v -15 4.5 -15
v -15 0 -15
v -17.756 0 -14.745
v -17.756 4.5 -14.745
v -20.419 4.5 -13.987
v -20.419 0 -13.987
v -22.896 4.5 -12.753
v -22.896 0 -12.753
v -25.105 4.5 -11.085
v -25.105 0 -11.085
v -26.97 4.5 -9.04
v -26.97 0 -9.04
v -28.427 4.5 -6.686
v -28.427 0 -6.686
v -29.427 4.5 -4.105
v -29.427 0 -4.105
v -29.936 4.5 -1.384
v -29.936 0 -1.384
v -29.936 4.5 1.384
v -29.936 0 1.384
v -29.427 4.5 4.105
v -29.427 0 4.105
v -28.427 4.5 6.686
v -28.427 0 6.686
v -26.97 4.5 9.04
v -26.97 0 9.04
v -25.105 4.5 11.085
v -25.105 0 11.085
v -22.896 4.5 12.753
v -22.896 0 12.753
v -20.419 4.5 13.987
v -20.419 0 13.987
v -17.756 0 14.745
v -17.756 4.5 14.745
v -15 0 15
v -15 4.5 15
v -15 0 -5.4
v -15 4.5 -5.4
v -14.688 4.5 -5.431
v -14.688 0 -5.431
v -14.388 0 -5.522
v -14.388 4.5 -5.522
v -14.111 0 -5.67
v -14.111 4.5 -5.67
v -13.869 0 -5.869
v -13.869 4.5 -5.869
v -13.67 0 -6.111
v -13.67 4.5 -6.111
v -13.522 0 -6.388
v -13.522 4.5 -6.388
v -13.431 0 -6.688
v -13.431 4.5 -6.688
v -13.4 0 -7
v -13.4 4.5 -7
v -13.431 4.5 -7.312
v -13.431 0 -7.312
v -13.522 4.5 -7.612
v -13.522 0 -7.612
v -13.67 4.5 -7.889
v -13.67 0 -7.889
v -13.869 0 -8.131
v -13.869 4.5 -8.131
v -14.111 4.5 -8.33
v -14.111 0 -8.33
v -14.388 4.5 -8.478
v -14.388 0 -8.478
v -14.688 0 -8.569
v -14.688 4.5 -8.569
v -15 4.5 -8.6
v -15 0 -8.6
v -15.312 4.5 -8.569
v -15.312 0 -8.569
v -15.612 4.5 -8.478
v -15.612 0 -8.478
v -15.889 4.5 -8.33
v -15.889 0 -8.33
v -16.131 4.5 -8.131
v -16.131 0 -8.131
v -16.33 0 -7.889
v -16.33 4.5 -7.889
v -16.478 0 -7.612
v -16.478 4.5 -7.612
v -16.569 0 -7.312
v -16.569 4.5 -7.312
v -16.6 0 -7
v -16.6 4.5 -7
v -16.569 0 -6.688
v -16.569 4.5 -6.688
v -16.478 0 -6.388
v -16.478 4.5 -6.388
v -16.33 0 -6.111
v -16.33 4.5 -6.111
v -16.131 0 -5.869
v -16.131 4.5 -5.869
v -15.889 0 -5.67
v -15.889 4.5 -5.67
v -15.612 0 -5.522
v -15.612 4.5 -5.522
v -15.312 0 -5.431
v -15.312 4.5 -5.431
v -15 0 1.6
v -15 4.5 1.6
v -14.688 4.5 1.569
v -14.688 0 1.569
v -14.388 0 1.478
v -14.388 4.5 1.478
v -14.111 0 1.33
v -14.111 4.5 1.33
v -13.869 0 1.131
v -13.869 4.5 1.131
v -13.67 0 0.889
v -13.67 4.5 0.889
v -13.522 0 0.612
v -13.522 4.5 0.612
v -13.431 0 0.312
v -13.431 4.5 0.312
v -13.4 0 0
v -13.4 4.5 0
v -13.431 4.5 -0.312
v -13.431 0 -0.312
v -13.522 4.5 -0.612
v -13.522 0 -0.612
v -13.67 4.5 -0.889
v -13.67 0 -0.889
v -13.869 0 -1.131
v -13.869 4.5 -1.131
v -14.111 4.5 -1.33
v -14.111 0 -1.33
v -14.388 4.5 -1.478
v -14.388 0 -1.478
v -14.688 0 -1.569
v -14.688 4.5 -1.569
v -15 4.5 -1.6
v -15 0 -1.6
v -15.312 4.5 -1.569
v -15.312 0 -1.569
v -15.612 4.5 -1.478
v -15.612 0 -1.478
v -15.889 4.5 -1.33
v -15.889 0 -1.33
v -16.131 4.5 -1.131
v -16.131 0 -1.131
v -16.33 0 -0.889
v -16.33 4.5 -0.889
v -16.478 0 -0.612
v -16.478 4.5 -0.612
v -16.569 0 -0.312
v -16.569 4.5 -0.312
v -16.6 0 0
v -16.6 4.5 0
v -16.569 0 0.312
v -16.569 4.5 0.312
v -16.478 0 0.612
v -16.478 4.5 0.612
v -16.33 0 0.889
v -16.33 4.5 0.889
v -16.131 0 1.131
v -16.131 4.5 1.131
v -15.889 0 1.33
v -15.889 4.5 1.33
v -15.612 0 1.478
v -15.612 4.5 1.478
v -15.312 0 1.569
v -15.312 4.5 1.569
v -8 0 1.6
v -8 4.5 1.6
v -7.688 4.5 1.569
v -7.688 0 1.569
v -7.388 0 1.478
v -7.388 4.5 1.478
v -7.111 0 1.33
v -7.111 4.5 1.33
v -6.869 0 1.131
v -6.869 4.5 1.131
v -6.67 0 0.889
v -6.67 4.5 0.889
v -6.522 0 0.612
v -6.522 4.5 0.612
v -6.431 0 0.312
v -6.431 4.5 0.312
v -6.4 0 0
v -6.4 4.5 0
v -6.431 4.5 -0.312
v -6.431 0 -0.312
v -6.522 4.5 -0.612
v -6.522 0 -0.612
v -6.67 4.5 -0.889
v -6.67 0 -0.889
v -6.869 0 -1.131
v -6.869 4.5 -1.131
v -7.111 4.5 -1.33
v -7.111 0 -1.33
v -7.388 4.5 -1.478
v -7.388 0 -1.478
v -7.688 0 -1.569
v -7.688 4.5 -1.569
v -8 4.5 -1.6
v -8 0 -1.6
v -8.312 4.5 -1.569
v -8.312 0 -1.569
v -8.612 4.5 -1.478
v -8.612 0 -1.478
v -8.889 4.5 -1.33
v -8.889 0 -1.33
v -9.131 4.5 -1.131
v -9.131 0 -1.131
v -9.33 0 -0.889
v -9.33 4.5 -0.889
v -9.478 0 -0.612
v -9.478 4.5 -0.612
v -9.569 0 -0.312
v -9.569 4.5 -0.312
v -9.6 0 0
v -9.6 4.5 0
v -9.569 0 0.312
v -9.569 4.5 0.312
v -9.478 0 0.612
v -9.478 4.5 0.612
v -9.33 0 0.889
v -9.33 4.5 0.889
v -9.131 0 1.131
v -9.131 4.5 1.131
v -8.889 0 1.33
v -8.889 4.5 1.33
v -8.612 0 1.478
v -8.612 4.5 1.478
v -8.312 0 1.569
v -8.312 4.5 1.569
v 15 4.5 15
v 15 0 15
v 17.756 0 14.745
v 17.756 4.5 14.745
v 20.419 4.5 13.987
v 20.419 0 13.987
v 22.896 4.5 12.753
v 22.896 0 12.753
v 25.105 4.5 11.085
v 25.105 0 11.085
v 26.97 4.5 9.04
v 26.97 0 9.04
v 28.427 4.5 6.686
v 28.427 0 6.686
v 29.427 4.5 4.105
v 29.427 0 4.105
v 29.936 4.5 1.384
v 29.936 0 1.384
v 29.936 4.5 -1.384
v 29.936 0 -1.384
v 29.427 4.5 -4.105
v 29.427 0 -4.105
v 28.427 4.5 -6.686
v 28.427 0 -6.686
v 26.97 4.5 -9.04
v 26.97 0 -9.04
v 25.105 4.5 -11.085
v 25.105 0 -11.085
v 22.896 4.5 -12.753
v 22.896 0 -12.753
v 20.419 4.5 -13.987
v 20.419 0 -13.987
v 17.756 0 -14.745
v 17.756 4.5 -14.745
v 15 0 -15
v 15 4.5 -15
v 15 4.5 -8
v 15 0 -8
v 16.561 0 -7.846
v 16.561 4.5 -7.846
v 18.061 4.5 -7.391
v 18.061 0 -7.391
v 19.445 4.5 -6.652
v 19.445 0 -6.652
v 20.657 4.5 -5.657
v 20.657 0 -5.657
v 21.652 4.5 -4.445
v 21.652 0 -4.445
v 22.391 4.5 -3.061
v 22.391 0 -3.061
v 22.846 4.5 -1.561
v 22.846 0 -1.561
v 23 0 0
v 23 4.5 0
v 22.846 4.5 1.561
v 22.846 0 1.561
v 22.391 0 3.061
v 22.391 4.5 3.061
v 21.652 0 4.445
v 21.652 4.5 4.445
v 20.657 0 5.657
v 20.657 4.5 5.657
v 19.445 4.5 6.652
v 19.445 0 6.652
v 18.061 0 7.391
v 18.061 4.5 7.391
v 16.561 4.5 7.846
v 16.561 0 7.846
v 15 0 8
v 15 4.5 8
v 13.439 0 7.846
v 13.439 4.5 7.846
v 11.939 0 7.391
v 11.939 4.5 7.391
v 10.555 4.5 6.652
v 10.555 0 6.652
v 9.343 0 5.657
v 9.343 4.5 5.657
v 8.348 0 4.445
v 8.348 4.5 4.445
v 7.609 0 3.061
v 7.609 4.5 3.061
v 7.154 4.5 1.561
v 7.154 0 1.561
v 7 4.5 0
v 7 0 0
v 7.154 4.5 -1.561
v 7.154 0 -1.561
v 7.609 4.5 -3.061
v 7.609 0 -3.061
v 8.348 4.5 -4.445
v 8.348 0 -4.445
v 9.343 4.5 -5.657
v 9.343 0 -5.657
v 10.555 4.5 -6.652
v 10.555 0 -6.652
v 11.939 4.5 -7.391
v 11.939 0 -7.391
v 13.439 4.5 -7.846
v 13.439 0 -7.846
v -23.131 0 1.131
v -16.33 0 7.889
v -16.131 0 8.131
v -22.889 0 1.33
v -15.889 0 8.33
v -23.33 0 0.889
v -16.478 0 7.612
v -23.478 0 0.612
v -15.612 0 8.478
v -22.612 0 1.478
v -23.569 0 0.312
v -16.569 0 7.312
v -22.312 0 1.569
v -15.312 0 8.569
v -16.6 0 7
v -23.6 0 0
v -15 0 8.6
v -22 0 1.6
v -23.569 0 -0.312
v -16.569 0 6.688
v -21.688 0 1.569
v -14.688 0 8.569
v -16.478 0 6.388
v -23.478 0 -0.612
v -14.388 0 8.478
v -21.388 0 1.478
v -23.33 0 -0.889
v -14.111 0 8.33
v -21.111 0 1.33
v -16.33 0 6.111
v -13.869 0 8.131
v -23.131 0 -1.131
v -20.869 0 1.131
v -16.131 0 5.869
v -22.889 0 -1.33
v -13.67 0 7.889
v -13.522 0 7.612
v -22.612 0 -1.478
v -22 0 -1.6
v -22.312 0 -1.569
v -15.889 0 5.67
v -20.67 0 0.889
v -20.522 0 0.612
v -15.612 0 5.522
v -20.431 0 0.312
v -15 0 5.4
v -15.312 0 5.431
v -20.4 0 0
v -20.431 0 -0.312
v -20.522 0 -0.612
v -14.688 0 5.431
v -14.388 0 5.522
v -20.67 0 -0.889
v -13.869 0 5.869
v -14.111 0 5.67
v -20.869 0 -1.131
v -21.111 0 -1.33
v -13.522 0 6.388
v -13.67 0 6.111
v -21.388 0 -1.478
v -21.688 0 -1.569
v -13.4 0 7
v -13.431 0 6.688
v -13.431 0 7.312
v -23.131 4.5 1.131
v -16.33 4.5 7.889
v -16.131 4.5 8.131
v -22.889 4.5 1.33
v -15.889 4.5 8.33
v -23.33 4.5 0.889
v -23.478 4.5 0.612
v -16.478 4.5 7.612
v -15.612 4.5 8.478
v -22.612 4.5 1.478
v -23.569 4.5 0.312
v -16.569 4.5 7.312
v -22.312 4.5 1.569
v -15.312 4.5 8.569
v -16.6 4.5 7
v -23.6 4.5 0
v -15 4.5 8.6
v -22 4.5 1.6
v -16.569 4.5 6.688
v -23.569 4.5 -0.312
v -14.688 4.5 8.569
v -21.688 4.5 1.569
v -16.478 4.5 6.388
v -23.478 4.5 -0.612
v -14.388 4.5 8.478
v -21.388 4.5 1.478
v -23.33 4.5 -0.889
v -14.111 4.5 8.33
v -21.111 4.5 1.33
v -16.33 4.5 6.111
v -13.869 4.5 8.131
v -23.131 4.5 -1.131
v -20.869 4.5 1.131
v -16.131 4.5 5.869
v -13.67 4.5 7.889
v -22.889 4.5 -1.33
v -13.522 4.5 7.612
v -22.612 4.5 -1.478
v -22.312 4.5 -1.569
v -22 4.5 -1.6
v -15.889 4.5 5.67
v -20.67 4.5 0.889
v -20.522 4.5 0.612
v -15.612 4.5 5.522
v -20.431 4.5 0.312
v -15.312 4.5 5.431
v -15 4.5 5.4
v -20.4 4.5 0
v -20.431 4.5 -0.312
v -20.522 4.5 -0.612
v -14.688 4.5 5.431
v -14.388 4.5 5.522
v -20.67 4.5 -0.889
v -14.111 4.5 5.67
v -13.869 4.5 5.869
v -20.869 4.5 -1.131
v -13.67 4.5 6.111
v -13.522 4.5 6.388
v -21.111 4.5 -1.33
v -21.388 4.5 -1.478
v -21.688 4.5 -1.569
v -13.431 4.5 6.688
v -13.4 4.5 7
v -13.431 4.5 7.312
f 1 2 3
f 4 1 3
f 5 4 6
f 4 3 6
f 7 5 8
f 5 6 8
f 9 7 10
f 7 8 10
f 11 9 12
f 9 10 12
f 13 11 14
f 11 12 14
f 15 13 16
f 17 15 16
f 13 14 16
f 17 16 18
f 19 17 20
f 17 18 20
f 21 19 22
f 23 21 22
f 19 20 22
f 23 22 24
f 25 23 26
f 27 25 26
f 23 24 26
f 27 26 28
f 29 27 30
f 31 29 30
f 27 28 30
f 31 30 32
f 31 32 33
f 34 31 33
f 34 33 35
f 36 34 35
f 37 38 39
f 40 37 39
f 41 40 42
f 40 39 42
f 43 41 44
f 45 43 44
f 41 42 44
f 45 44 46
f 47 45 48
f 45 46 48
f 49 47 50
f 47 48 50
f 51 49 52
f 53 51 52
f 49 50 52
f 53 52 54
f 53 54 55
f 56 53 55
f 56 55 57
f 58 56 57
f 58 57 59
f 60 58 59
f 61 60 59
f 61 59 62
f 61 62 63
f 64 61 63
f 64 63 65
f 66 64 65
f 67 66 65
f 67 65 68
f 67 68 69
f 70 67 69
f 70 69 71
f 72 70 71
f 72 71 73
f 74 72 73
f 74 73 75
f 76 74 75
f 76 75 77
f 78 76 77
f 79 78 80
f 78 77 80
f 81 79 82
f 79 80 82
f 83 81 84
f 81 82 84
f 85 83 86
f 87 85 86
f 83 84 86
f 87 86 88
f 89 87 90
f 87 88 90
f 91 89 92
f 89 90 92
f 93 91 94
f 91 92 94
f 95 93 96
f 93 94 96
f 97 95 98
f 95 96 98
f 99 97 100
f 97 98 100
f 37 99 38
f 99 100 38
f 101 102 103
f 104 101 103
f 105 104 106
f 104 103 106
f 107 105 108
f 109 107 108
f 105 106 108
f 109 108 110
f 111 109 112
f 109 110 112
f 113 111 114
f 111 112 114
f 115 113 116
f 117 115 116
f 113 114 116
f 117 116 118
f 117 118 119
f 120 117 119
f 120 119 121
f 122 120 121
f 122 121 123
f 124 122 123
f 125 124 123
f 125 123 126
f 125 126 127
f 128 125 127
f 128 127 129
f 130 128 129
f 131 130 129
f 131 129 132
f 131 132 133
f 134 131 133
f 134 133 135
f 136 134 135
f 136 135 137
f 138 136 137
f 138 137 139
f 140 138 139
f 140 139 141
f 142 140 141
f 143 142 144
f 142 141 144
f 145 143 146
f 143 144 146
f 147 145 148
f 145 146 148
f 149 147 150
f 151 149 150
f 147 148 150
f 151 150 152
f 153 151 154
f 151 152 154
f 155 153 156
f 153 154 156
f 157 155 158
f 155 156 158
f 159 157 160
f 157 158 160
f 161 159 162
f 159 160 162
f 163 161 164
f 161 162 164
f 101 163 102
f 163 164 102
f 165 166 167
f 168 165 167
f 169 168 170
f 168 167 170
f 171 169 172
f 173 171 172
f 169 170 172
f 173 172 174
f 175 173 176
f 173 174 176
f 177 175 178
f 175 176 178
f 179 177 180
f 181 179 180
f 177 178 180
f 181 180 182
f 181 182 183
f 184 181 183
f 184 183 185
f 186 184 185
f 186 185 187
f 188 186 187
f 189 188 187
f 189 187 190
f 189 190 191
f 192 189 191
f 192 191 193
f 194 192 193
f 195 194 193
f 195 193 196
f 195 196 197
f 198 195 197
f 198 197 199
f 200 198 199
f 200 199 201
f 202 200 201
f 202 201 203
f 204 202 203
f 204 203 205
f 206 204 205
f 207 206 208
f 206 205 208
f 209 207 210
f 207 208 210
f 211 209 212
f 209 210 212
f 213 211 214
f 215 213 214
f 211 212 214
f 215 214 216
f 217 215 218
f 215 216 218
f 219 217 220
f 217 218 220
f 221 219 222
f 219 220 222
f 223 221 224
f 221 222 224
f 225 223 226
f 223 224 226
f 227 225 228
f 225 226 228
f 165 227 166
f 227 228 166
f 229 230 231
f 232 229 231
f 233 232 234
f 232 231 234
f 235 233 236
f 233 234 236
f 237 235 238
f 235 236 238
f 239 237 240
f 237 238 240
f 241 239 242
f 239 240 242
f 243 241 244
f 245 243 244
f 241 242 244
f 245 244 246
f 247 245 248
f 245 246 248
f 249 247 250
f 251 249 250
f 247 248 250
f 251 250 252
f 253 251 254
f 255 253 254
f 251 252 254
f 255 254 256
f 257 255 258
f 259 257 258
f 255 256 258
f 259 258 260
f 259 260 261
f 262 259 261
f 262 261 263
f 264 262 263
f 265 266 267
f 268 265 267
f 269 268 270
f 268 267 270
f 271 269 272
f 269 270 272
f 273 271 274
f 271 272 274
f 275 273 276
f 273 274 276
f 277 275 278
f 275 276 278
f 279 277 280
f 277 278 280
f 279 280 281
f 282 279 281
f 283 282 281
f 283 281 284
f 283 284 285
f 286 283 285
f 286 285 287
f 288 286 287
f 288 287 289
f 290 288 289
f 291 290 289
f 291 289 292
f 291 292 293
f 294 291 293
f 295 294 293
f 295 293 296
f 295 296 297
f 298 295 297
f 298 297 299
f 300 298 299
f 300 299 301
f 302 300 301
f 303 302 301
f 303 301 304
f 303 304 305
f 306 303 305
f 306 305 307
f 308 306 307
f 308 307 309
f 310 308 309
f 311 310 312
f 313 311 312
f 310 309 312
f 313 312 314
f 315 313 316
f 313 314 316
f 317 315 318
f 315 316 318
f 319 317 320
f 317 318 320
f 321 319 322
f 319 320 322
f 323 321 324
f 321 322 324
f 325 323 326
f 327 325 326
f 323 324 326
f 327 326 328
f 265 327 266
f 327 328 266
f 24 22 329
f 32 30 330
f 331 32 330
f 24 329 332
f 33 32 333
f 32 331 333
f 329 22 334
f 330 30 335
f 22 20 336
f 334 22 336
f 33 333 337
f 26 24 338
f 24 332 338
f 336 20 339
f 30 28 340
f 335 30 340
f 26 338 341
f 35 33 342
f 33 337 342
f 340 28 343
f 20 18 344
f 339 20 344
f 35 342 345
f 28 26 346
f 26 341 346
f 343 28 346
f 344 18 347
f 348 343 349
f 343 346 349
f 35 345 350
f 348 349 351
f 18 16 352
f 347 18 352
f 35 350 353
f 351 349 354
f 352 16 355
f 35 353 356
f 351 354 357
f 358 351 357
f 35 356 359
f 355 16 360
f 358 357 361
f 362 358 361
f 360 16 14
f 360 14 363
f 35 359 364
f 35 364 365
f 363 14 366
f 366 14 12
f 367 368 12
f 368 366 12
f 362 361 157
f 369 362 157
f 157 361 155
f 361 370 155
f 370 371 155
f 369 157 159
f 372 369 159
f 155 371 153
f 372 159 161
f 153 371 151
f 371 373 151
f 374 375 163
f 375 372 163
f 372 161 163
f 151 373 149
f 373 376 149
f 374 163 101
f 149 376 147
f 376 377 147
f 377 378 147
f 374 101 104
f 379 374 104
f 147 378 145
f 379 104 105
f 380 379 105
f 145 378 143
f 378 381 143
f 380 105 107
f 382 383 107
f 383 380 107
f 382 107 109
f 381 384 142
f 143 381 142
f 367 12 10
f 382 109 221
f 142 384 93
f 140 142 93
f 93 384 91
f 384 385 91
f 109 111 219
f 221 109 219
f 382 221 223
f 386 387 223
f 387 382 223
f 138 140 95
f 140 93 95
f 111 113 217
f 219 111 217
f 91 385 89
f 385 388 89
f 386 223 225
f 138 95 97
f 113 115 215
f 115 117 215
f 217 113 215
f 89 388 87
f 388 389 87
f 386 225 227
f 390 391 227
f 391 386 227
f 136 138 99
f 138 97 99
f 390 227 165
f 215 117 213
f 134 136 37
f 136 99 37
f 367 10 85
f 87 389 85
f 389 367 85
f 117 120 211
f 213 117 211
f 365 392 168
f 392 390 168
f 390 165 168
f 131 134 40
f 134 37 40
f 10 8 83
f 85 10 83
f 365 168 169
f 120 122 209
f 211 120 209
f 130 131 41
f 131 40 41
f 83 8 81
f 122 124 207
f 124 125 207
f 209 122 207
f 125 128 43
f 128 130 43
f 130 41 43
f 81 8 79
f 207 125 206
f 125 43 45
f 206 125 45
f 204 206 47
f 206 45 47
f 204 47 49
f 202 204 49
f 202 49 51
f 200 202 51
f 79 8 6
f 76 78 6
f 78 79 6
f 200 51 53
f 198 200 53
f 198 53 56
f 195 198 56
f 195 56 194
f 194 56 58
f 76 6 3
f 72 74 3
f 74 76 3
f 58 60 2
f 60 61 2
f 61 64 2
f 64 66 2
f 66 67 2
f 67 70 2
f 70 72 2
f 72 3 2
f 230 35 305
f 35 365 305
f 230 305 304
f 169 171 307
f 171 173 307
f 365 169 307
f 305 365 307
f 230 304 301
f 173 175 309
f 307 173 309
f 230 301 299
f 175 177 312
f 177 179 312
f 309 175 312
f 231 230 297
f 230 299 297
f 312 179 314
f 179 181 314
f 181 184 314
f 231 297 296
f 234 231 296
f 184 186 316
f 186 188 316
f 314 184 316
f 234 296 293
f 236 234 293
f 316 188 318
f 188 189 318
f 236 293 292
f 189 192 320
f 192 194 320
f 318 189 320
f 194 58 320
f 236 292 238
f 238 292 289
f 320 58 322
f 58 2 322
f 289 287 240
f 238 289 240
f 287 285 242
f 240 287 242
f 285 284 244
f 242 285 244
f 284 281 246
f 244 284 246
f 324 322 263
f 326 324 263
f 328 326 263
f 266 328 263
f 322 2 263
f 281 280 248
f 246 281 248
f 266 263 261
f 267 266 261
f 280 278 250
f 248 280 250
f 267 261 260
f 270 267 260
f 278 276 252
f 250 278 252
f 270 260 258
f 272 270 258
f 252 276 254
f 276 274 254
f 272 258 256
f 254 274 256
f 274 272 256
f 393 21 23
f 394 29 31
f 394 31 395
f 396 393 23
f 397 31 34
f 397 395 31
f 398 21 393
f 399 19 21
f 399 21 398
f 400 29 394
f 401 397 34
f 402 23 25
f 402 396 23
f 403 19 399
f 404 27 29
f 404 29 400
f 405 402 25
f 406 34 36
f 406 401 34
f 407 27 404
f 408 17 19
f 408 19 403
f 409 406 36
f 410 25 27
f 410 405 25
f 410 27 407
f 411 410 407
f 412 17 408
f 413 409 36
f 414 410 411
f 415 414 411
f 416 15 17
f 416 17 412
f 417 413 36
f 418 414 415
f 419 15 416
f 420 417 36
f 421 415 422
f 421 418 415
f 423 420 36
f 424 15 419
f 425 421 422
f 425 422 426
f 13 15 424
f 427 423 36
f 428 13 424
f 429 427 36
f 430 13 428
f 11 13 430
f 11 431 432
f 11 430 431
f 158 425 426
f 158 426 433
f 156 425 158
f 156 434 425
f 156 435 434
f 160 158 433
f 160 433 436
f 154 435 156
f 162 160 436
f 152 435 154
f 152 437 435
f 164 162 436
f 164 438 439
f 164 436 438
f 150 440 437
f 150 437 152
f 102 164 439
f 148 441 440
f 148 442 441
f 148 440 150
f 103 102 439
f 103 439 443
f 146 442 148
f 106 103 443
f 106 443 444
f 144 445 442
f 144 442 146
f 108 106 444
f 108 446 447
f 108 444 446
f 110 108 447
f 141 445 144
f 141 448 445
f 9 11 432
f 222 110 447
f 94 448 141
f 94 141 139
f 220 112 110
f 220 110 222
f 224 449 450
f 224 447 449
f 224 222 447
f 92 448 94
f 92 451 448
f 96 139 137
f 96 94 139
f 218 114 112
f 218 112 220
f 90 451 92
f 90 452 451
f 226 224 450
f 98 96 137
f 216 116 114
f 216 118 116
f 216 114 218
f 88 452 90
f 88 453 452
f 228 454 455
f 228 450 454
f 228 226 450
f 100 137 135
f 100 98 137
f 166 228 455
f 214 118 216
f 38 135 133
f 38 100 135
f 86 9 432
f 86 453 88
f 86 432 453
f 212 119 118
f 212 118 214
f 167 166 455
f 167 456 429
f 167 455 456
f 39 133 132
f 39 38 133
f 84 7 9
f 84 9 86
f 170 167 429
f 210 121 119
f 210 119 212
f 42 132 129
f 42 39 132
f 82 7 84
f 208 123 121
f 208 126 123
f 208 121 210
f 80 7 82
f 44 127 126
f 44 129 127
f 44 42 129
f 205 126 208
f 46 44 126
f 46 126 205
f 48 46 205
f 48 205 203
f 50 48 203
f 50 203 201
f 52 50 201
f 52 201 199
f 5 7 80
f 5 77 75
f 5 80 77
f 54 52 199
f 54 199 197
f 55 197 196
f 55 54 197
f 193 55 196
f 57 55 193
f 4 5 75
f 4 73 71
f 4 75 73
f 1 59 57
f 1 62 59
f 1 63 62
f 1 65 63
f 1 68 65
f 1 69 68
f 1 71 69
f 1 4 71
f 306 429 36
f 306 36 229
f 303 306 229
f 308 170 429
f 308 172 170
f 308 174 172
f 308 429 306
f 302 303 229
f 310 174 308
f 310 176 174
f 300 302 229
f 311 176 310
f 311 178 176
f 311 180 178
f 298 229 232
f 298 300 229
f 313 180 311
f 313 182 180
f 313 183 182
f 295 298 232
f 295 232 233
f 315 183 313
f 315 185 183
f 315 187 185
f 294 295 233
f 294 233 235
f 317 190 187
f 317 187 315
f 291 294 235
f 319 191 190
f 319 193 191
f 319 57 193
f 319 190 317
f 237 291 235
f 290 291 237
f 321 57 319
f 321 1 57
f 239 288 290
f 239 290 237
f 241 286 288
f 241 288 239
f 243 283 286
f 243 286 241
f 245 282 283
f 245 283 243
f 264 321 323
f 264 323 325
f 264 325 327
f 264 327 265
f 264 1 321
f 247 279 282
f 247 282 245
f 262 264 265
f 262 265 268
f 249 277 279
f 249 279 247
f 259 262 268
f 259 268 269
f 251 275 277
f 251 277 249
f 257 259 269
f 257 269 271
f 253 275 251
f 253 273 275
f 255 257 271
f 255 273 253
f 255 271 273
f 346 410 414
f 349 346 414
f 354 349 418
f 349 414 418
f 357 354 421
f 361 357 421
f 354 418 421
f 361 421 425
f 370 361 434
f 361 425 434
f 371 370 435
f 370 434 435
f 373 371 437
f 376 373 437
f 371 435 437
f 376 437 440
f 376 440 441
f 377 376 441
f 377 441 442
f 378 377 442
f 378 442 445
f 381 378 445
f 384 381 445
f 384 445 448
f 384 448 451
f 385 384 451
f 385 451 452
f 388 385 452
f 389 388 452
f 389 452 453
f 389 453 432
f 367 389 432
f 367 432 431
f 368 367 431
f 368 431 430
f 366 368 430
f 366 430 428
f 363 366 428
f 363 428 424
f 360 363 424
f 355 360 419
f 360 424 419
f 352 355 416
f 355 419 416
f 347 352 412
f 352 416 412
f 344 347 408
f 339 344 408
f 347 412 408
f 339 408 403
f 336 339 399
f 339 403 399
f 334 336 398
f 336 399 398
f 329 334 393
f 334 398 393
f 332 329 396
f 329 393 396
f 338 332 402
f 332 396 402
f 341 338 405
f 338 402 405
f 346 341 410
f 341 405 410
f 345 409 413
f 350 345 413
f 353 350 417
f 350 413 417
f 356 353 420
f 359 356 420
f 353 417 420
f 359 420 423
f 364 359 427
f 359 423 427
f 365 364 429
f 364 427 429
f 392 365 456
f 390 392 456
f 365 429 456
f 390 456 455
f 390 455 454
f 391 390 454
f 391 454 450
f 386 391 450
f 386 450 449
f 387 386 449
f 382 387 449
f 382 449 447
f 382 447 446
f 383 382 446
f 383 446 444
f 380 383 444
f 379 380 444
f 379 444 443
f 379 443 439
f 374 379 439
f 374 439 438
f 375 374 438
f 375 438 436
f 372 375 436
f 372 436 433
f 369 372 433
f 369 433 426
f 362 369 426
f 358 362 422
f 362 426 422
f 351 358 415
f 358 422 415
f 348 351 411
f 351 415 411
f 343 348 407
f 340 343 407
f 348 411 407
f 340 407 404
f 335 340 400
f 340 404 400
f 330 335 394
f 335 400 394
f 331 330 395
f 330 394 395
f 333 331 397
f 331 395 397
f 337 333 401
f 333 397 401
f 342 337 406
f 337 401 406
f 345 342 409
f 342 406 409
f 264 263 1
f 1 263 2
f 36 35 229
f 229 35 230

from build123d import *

# Parameters (mm, degrees)
BOSS_EXTRUDE1_DEPTH     = 4.5
SKETCH4_R               = 1.6
SERVO_HORN_HOLES_DEPTH  = 34.841542518
SKETCH5_R               = 8
BEARING_PRESS_FIT_DEPTH = 34.841542518


with BuildPart() as part:
    # Sketch2 → Boss-Extrude1 (new body)
    with BuildSketch(Plane(origin=(0, 0, 0), x_dir=(1, 0, 0), z_dir=(0, 1, 0))):
        with BuildLine():
            Line((15, 15), (-15, 15))
            ThreePointArc((-15, 15), (-30, 0), (-15, -15))
            Line((-15, -15), (15, -15))
            ThreePointArc((15, -15), (30, 0), (15, 15))
        make_face()
    extrude(amount=BOSS_EXTRUDE1_DEPTH)

    # Sketch4 → Servo horn holes (cut, through all)
    with BuildSketch(Plane(origin=(0, 4.5, 0), x_dir=(1, 0, 0), z_dir=(0, 1, 0))):
        with Locations(Location((-15, 0, 0), (0, 0, 270))):
            Circle(SKETCH4_R)
        with Locations(Location((-8, 0, 0), (0, 0, 270))):
            Circle(SKETCH4_R)
        with Locations(Location((-15, -7, 0), (0, 0, 270))):
            Circle(SKETCH4_R)
        with Locations(Location((-22, 0, 0), (0, 0, 270))):
            Circle(SKETCH4_R)
        with Locations(Location((-15, 7, 0), (0, 0, 270))):
            Circle(SKETCH4_R)
    extrude(amount=-SERVO_HORN_HOLES_DEPTH, mode=Mode.SUBTRACT)

    # Sketch5 → Bearing press fit (cut, through all)
    with BuildSketch(Plane(origin=(0, 0, 0), x_dir=(-1, 0, 0), z_dir=(0, -1, 0))):
        with Locations(Location((-15, 0, 0), (0, 0, 90))):
            Circle(SKETCH5_R)
    extrude(amount=-BEARING_PRESS_FIT_DEPTH, mode=Mode.SUBTRACT)


solid = part.part
